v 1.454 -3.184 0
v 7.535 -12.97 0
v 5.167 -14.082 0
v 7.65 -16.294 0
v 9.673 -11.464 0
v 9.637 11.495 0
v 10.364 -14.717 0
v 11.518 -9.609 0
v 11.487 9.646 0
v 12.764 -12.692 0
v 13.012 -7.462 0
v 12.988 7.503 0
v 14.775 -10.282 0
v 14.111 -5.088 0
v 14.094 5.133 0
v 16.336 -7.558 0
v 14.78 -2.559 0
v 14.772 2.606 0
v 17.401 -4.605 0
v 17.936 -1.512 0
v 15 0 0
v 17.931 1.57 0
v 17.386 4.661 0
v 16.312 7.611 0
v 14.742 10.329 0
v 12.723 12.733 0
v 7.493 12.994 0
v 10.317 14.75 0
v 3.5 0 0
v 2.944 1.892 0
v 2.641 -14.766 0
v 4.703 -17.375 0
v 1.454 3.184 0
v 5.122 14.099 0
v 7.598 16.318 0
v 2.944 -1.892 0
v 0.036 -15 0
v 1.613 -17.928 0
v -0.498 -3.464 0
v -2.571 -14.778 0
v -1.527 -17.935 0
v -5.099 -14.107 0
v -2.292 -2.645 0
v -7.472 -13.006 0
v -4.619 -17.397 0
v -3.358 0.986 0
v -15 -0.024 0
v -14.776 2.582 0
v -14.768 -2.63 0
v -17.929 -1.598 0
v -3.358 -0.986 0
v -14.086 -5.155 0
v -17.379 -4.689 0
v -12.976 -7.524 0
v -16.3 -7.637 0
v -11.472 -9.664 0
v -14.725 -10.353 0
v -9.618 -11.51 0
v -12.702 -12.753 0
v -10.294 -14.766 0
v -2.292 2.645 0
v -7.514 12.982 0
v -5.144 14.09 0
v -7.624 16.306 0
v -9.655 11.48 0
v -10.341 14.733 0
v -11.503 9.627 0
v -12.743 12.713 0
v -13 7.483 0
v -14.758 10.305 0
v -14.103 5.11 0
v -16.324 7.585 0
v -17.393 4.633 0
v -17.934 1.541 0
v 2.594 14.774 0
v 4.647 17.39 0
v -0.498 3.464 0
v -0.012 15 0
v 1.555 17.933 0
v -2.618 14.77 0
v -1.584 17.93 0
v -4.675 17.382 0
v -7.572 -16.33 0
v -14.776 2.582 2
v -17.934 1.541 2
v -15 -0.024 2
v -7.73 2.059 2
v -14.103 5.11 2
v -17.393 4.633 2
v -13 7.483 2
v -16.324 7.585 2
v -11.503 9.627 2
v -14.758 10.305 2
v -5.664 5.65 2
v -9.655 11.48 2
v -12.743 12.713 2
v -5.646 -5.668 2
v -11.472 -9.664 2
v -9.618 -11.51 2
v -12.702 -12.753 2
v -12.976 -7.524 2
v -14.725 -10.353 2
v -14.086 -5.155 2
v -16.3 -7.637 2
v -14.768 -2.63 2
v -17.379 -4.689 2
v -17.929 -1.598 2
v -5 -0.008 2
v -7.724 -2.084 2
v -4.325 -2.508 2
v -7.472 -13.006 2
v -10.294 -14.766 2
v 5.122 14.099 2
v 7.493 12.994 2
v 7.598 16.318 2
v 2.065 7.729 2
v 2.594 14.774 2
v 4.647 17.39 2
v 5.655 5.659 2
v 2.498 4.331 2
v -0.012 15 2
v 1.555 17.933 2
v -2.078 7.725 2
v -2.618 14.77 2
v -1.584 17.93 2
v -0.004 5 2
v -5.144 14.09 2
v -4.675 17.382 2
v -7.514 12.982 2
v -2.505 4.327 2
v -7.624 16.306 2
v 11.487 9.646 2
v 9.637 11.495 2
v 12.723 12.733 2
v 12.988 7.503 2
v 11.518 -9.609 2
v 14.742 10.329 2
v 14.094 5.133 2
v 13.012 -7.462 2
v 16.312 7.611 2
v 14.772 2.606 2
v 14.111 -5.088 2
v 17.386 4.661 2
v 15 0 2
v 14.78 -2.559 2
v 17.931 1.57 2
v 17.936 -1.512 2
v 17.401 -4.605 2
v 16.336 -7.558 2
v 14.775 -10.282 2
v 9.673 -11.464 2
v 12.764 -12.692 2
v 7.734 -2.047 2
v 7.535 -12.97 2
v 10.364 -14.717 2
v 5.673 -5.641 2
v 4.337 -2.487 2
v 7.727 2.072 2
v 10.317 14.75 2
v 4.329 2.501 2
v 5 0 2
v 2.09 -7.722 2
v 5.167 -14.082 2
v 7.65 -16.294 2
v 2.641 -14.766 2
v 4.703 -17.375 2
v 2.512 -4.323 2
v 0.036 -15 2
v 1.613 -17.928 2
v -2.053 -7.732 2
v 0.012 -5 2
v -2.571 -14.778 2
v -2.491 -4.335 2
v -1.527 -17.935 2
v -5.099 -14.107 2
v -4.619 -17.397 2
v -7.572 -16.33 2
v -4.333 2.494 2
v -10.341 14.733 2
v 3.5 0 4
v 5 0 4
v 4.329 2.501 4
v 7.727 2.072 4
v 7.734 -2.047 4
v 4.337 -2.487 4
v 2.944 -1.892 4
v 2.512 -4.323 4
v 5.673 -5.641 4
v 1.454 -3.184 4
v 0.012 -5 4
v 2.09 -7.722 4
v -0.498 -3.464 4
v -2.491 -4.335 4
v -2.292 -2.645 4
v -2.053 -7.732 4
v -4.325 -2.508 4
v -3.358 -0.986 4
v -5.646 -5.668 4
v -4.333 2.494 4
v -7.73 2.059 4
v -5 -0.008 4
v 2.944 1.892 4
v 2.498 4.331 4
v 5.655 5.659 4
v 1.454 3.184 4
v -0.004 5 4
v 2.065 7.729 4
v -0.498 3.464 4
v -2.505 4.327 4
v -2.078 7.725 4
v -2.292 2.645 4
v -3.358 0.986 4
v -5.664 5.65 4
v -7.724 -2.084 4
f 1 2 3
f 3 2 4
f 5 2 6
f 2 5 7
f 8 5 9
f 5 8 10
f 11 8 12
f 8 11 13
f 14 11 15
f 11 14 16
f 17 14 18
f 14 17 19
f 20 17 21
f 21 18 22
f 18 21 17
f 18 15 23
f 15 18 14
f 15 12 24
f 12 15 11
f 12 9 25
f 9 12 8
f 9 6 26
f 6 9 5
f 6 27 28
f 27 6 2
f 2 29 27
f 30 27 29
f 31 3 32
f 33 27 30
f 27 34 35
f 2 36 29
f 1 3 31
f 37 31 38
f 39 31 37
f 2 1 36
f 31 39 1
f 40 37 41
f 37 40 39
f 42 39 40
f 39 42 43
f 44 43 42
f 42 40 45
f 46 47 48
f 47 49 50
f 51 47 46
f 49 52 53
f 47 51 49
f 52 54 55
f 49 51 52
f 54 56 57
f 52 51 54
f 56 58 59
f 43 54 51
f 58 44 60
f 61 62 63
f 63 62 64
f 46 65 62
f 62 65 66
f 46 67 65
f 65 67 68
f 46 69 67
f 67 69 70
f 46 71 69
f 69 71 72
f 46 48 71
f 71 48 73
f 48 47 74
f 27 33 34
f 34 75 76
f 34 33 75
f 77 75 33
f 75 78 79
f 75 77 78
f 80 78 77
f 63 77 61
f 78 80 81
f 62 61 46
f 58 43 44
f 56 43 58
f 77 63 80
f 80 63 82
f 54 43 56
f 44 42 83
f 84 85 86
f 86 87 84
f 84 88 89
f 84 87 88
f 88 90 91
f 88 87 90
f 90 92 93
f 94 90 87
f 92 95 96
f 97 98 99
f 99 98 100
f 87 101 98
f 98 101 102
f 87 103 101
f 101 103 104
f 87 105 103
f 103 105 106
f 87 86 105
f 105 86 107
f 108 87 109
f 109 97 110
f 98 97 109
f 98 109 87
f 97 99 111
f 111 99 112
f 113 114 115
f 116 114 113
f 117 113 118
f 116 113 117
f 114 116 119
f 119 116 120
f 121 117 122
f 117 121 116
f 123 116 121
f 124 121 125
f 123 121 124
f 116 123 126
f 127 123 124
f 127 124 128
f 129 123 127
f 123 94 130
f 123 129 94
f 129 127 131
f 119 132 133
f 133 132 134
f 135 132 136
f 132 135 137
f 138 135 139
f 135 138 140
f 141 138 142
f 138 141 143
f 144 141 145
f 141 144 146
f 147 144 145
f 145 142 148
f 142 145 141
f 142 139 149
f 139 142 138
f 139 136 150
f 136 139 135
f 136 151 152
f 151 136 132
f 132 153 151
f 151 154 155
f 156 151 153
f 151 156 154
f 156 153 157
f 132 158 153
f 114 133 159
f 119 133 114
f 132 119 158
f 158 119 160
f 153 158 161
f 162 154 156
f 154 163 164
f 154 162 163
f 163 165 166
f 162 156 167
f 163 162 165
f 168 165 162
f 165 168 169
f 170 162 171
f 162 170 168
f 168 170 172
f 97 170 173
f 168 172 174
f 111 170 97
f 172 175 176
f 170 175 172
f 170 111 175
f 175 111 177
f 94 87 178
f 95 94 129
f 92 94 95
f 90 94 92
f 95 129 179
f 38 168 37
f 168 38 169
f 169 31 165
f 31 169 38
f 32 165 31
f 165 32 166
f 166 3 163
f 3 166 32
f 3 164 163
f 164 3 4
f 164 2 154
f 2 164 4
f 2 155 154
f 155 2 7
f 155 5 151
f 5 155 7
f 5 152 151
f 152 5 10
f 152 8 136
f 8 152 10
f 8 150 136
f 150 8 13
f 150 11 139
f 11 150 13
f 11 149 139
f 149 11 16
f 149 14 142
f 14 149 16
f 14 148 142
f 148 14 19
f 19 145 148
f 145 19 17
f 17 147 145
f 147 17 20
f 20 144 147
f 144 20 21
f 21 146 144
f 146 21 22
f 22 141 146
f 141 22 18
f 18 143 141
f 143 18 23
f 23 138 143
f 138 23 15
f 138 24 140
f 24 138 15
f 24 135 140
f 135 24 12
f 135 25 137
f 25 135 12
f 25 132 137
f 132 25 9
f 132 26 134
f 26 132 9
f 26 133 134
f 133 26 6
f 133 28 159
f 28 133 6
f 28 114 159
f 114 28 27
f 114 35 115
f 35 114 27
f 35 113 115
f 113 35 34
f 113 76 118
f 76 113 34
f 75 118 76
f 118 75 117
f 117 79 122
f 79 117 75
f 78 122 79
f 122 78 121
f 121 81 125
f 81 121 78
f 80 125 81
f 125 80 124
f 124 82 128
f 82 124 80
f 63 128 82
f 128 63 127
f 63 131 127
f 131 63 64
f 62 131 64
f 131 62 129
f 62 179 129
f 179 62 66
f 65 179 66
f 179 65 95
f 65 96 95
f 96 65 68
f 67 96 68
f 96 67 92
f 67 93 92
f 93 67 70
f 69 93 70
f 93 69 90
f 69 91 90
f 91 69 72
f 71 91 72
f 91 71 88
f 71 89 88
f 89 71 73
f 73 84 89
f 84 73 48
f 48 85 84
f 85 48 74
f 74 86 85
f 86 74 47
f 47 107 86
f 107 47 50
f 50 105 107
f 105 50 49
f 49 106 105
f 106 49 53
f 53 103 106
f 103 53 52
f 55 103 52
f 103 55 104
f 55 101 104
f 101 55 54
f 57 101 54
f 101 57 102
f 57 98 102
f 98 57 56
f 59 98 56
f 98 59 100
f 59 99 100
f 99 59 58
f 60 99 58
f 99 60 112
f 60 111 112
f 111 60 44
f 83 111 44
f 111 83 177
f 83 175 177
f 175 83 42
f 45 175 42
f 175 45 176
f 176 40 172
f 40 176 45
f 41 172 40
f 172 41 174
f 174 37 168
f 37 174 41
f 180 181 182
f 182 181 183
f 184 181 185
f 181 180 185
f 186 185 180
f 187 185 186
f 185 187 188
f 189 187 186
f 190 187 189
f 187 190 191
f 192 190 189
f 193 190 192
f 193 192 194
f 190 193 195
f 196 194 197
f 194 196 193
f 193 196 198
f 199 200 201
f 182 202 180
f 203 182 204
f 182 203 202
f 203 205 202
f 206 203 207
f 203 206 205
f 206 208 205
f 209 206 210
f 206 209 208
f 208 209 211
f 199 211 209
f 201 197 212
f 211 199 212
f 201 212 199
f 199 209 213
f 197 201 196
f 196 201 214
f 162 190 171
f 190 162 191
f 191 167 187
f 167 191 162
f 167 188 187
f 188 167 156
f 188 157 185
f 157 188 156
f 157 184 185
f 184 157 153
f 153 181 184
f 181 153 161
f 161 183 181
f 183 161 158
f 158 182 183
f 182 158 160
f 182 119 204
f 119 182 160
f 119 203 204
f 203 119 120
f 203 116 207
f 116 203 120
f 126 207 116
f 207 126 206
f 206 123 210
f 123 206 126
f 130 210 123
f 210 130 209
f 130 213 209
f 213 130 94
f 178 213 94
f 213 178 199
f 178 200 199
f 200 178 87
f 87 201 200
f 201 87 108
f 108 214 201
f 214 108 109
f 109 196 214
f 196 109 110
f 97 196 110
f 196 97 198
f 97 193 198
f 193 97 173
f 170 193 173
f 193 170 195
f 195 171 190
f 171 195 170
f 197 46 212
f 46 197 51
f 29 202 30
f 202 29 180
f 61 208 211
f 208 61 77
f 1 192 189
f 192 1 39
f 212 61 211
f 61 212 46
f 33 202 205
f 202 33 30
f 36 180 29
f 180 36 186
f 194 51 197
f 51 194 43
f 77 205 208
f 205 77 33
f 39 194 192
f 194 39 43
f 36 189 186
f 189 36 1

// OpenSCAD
max_width = 5/sqrt(2);
//  Main part

module wheel(r_small, extrusion)
{
    //  Preset calculations that are based on values picked as visually good.
    teeth = r_small*2*3.14/2.618;
    r_big = r_small + 3;
    
    angle_amount = teeth*2;
    points = [for(i=[0: 1: angle_amount]) [i%2? cos(360/angle_amount*i)*r_big : cos(360/angle_amount*i)*r_small, i%2? sin(360/angle_amount*i)*r_big : sin(360/angle_amount*i)*r_small]];
    linear_extrude(extrusion)
    polygon(points);
}


difference(){
    union(){
        wheel(15, 2);
        wheel(5, 4);
        
    }
    cylinder(4, 3.5, 3.5);
}
